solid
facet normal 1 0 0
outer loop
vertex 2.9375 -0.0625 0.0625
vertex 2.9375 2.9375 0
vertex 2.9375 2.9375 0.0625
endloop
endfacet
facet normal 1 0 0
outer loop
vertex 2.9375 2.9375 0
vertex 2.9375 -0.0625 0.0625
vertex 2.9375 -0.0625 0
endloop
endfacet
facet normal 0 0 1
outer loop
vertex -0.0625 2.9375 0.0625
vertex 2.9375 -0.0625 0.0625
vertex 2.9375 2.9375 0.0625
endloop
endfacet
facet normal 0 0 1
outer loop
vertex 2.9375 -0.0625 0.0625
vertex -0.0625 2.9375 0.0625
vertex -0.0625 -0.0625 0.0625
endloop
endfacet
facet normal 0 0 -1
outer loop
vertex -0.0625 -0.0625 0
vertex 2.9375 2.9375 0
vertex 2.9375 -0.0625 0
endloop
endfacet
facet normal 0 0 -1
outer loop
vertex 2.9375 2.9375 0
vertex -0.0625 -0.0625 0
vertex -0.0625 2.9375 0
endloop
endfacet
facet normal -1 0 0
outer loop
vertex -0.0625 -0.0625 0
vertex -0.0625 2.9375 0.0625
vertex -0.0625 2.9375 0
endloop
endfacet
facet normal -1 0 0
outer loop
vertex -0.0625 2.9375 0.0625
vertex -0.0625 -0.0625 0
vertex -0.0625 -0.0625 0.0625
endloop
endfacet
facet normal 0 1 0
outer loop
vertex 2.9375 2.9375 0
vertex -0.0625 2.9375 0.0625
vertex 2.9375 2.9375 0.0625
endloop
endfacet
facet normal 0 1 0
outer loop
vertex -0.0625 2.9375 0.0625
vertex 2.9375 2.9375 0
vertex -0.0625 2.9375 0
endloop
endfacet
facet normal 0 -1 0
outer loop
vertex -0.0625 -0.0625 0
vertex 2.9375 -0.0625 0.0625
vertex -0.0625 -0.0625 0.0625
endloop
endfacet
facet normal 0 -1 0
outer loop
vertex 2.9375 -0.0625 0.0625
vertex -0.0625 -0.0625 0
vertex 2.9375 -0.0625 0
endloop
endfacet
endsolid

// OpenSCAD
// element10.scad
// Units: inches

plate_w = 2 + 7/8;
plate_d = 2 + 7/8;
plate_h = 1/16;

hole_d = 3/32;
hole_r = hole_d / 2;

module rivet_holes() {
    // 10 holes per side; inset = half the spacing so holes form a clean frame
    spacing_x = plate_w / 10;
    spacing_y = plate_d / 10;
    inset_x   = spacing_x / 2;
    inset_y   = spacing_y / 2;
/*
    // Front edge
    for (i = [0:9])
        translate([inset_x + i * spacing_x, inset_y, -1])
            cylinder(h = plate_h + 2, r = hole_r, $fn = 20);

    // Back edge
    for (i = [0:9])
        translate([inset_x + i * spacing_x, plate_d - inset_y, -1])
            cylinder(h = plate_h + 2, r = hole_r, $fn = 20);
*/
    // Left edge
    for (i = [0:9])
        translate([inset_x, inset_y + i * spacing_y, -1])
            cylinder(h = plate_h + 2, r = hole_r, $fn = 20);

    // Right edge
    for (i = [0:9])
        translate([plate_w - inset_x, inset_y + i * spacing_y, -1])
            cylinder(h = plate_h + 2, r = hole_r, $fn = 20);
}

rivet_h = plate_h;

module rivets() {
    spacing_x = plate_w / 10;
    spacing_y = plate_d / 10;
    inset_x   = spacing_x / 2;
    inset_y   = spacing_y / 2;

    color("lightgray") {
/*
        // Front edge
        for (i = [0:9])
            translate([inset_x + i * spacing_x, inset_y, 0])
                cylinder(h = rivet_h, r = hole_r, $fn = 20);

        // Back edge
        for (i = [0:9])
            translate([inset_x + i * spacing_x, plate_d - inset_y, 0])
                cylinder(h = rivet_h, r = hole_r, $fn = 20);
*/
        // Left edge
        for (i = [0:9])
            translate([inset_x, inset_y + i * spacing_y, 0])
                cylinder(h = rivet_h, r = hole_r, $fn = 20);

        // Right edge
        for (i = [0:9])
            translate([plate_w - inset_x, inset_y + i * spacing_y, 0])
                cylinder(h = rivet_h, r = hole_r, $fn = 20);
    }
}

frame_w = 1/16;

// Roller slots
roller_count  = 11;
roller_h_size = 3/16;   // top-to-bottom thickness of each roller slot
roller_r      = roller_h_size / 2;

// Available space inside rivet frame (same inset as rivet spacing)
roller_inset_x = (plate_w / 10) / 2;
roller_inset_y = (plate_d / 10) / 2;
roller_zone_w  = plate_w - 2 * roller_inset_x;
roller_zone_d  = plate_d - 2 * roller_inset_y;

// Gap between rollers: split remaining vertical space evenly across 12 gaps
roller_gap = (roller_zone_d - roller_count * roller_h_size) / (roller_count + 1);

module roller_slots() {
    // Additional left/right clearzone equal to rivet-to-edge inset
    roller_x_start = 2 * roller_inset_x;
    roller_x_end   = plate_w - 2 * roller_inset_x;

    for (i = [0:roller_count - 1]) {
        cy = roller_inset_y + roller_gap + roller_r + i * (roller_h_size + roller_gap);
        translate([0, 0, -0.001])
        // Stadium shape: hull of two cylinders
        hull() {
            translate([roller_x_start + roller_r, cy, 0])
                cylinder(h = plate_h + 0.002, r = roller_r, $fn = 20);
            translate([roller_x_end - roller_r, cy, 0])
                cylinder(h = plate_h + 0.002, r = roller_r, $fn = 20);
        }
    }
}

belt_w = 1.5;
belt_d = 2 + 13/16;

module rollers() {
    roller_x_start = 2 * roller_inset_x;
    roller_x_end   = plate_w - 2 * roller_inset_x;

    color("green")
    difference() {
        for (i = [0:roller_count - 1]) {
            cy = roller_inset_y + roller_gap + roller_r + i * (roller_h_size + roller_gap);
            hull() {
                translate([roller_x_start + roller_r, cy, 0])
                    cylinder(h = plate_h, r = roller_r, $fn = 20);
                translate([roller_x_end - roller_r, cy, 0])
                    cylinder(h = plate_h, r = roller_r, $fn = 20);
            }
        }
        belt_cutout();
    }
}

module frame() {
    color("black")
    difference() {
        translate([-frame_w, -frame_w, 0])
            cube([plate_w + 2*frame_w, plate_d + 2*frame_w, plate_h]);
        translate([0, 0, -0.001])
            cube([plate_w, plate_d, plate_h + 0.002]);
    }
}

module belt_cutout() {
    translate([(plate_w - belt_w) / 2, -0.001, -0.001])
        cube([belt_w, plate_d + 0.002, plate_h + 0.002]);
}

module plate() {
    difference() {
        color("darkgray")
            cube([plate_w, plate_d, plate_h]);
        rivet_holes();
        roller_slots();
        belt_cutout();
    }
}

arrow_w       = belt_w * 0.75;
arrow_h       = 1/2 * plate_d;
arrow_outline = 1/16;

arrow_head_h  = arrow_w / 2;
arrow_shaft_w = arrow_w * 0.4;
arrow_shaft_h = arrow_h - arrow_head_h;

module arrow_2d() {
    polygon([
        [-arrow_shaft_w/2, 0],
        [ arrow_shaft_w/2, 0],
        [ arrow_shaft_w/2, arrow_shaft_h],
        [ arrow_w/2,       arrow_shaft_h],
        [ 0,               arrow_h],
        [-arrow_w/2,       arrow_shaft_h],
        [-arrow_shaft_w/2, arrow_shaft_h]
    ]);
}

module arrow_cutout() {
    translate([plate_w/2, (plate_d - arrow_h)/2, -0.001])
    linear_extrude(plate_h + 0.002)
    difference() {
        arrow_2d();
        offset(delta = -arrow_outline) arrow_2d();
    }
}

module arrow() {
    color("green")
    translate([plate_w/2, (plate_d - arrow_h)/2, 0])
    linear_extrude(plate_h)
    difference() {
        arrow_2d();
        offset(delta = -arrow_outline) arrow_2d();
    }
}

module belt() {
    color("black")
    difference() {
        translate([(plate_w - belt_w) / 2, 0, 0])
            cube([belt_w, plate_d, plate_h]);
        arrow_cutout();
    }
}

frame();
plate();
rivets();
rollers();
belt();
arrow();
